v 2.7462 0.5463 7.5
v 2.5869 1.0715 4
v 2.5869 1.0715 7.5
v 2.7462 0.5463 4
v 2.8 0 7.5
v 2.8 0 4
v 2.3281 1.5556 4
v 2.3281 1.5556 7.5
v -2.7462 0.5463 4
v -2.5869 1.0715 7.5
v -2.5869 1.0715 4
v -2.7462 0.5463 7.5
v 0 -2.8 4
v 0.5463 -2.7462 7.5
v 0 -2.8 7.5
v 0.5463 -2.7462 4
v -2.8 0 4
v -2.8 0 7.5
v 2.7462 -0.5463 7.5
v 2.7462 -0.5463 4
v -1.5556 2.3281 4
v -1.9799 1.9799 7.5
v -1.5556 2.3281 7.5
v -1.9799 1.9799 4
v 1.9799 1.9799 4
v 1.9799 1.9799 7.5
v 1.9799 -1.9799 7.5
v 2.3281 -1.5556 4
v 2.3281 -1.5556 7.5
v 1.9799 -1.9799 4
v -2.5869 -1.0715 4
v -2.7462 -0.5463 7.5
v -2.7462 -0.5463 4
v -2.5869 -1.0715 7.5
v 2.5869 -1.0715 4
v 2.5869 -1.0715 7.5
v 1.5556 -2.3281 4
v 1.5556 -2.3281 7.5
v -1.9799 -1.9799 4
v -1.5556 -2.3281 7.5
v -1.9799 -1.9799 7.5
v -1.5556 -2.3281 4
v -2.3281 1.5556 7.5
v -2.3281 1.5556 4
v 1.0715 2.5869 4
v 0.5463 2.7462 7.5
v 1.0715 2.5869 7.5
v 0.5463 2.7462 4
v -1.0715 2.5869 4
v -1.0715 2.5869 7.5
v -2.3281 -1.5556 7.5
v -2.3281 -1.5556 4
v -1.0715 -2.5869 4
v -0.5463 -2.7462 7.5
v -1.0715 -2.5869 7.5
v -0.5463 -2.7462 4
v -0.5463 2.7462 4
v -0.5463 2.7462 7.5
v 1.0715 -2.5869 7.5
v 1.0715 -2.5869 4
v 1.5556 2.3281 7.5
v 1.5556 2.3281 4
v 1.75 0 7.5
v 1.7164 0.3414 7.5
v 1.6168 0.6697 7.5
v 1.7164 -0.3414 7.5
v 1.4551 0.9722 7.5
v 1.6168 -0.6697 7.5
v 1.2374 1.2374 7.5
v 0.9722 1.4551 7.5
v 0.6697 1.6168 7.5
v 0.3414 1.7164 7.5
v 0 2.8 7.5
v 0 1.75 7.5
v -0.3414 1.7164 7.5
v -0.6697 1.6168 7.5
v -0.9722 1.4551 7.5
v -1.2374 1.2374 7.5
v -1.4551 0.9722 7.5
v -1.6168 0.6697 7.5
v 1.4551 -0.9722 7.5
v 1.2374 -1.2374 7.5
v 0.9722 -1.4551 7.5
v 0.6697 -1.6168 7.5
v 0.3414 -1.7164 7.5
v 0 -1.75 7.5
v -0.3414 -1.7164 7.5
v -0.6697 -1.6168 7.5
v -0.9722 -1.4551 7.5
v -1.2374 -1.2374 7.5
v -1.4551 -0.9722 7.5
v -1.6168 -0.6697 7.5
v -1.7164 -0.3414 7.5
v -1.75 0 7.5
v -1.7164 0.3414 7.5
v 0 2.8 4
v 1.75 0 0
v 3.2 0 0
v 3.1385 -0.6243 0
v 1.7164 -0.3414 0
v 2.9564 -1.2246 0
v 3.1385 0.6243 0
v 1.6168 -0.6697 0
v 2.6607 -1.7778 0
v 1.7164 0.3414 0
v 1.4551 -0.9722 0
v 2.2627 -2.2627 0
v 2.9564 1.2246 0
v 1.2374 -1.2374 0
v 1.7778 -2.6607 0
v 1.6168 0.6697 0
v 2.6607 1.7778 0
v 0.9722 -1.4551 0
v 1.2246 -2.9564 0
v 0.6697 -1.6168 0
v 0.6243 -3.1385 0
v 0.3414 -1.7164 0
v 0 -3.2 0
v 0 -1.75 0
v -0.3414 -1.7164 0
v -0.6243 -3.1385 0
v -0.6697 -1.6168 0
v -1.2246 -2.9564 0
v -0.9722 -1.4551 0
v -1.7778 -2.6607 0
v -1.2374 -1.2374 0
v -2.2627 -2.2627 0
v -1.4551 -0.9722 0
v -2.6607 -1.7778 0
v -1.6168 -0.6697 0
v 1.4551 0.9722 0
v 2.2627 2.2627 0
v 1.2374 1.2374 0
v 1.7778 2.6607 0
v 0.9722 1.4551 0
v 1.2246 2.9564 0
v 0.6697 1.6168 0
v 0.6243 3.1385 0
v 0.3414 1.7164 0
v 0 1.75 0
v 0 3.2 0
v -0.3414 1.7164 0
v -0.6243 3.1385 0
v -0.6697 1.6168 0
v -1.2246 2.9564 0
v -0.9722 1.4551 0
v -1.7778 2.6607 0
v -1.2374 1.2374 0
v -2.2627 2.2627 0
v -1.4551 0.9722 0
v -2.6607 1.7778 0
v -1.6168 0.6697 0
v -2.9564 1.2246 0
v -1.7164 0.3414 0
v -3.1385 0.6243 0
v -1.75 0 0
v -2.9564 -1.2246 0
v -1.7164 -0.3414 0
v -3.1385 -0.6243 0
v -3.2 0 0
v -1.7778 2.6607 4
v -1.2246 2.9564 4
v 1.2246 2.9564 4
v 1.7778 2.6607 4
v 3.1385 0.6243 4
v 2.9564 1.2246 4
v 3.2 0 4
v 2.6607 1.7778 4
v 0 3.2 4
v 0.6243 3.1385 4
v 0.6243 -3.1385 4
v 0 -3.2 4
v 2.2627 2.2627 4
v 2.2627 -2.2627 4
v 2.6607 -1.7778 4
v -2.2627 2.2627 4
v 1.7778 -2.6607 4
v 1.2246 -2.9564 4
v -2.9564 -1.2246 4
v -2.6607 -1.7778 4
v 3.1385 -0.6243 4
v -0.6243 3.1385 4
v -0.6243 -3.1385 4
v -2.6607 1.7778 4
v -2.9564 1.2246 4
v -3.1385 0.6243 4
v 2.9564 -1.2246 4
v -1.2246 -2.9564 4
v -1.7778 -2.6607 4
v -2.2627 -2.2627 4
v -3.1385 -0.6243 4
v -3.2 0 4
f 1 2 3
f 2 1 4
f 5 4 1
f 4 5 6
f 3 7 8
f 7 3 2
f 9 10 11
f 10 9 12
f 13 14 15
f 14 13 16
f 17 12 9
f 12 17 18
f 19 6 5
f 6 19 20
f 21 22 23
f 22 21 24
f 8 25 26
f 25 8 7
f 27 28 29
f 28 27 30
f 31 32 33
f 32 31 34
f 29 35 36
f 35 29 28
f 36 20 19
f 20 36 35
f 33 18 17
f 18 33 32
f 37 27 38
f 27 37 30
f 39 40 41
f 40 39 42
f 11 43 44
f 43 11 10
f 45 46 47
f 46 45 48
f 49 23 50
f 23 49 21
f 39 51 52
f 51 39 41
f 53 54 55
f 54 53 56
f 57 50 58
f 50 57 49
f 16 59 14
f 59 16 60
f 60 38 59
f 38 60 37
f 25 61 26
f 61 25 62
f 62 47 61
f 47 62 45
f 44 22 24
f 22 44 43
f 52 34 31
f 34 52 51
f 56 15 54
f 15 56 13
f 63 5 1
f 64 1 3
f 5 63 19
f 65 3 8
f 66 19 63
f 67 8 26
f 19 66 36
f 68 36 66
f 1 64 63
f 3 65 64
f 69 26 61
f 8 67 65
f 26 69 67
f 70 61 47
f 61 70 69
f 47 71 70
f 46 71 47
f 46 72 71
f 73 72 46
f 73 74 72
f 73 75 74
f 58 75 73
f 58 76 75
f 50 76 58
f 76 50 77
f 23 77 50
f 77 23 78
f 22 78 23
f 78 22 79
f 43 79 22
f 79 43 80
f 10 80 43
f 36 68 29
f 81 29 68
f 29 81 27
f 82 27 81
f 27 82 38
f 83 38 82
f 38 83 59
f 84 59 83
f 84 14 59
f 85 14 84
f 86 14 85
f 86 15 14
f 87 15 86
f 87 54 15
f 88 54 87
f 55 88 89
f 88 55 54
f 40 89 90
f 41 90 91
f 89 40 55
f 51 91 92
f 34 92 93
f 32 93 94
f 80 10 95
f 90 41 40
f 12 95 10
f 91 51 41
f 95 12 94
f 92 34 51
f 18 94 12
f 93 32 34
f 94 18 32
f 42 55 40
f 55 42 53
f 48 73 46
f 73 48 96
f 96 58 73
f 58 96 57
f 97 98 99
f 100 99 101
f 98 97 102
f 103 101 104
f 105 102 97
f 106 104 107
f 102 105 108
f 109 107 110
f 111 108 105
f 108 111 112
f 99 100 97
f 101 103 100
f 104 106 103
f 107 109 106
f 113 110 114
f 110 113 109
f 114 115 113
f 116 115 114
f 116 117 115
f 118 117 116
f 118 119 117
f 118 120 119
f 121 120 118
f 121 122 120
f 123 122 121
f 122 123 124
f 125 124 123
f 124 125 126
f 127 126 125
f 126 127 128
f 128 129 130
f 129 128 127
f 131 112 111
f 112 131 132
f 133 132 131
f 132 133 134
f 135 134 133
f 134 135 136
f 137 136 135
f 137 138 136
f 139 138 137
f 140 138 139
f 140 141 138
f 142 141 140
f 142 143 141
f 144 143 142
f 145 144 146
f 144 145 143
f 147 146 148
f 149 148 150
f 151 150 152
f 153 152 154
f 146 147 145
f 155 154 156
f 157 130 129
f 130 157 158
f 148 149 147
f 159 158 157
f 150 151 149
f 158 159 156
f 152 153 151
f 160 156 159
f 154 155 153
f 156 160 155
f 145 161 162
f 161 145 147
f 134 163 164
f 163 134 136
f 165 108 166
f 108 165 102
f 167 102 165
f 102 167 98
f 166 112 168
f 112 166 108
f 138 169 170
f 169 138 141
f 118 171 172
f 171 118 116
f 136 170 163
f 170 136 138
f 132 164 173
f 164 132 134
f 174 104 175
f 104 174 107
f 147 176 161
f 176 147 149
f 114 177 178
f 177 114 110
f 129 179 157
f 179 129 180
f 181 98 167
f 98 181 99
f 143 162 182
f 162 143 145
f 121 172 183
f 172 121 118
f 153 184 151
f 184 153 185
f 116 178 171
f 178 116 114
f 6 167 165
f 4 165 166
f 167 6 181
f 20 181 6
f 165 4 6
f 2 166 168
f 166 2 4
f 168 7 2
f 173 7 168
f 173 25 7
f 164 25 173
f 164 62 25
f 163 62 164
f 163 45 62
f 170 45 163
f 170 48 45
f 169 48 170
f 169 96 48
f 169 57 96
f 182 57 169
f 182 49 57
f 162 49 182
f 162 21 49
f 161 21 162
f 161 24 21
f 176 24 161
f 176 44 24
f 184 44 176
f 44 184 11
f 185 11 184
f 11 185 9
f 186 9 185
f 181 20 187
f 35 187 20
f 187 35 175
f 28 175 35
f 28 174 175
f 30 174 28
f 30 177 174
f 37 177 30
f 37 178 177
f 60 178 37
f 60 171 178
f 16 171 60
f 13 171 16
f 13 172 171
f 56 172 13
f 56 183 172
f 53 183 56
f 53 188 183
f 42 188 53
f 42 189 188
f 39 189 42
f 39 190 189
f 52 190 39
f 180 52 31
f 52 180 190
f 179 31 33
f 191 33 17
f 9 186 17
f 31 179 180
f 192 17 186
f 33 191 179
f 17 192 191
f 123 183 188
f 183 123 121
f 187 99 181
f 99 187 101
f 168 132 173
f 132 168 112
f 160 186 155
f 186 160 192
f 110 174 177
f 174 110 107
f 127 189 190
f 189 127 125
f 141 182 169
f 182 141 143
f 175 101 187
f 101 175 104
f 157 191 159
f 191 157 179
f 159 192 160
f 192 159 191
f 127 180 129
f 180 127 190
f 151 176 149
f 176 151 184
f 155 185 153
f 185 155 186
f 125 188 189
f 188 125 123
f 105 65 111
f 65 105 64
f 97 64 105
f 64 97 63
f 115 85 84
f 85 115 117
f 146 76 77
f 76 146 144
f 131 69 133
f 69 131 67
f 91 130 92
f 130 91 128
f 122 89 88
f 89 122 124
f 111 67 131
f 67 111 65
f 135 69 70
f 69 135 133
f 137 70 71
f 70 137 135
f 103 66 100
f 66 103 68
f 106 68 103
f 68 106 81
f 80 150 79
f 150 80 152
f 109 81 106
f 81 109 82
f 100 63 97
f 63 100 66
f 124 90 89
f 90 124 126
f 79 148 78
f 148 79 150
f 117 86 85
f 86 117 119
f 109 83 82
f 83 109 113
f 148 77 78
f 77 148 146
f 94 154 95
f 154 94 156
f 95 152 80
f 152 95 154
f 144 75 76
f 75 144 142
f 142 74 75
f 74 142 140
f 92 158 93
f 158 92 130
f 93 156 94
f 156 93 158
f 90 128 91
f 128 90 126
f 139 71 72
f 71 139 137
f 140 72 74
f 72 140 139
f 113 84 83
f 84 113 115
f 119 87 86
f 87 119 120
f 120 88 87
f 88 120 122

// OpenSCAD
color("silver") {
  // spacers for belt medals
  // spacer(8,4);
  // spacer(5,1);

  // spacers for strap medals
  //spacer(4.5,1);
  spacer(7.5,4);

}

module spacer(totalH,spacerH) {
  difference() {
    union() {
      cylinder(r=2.8, h=totalH, $fn=32);
      cylinder(r=3.2, h=spacerH, $fn=32);
    }
    translate([0,0,-0.1]) cylinder(r=1.75, h=totalH+0.2, $fn=32);
  }
}
